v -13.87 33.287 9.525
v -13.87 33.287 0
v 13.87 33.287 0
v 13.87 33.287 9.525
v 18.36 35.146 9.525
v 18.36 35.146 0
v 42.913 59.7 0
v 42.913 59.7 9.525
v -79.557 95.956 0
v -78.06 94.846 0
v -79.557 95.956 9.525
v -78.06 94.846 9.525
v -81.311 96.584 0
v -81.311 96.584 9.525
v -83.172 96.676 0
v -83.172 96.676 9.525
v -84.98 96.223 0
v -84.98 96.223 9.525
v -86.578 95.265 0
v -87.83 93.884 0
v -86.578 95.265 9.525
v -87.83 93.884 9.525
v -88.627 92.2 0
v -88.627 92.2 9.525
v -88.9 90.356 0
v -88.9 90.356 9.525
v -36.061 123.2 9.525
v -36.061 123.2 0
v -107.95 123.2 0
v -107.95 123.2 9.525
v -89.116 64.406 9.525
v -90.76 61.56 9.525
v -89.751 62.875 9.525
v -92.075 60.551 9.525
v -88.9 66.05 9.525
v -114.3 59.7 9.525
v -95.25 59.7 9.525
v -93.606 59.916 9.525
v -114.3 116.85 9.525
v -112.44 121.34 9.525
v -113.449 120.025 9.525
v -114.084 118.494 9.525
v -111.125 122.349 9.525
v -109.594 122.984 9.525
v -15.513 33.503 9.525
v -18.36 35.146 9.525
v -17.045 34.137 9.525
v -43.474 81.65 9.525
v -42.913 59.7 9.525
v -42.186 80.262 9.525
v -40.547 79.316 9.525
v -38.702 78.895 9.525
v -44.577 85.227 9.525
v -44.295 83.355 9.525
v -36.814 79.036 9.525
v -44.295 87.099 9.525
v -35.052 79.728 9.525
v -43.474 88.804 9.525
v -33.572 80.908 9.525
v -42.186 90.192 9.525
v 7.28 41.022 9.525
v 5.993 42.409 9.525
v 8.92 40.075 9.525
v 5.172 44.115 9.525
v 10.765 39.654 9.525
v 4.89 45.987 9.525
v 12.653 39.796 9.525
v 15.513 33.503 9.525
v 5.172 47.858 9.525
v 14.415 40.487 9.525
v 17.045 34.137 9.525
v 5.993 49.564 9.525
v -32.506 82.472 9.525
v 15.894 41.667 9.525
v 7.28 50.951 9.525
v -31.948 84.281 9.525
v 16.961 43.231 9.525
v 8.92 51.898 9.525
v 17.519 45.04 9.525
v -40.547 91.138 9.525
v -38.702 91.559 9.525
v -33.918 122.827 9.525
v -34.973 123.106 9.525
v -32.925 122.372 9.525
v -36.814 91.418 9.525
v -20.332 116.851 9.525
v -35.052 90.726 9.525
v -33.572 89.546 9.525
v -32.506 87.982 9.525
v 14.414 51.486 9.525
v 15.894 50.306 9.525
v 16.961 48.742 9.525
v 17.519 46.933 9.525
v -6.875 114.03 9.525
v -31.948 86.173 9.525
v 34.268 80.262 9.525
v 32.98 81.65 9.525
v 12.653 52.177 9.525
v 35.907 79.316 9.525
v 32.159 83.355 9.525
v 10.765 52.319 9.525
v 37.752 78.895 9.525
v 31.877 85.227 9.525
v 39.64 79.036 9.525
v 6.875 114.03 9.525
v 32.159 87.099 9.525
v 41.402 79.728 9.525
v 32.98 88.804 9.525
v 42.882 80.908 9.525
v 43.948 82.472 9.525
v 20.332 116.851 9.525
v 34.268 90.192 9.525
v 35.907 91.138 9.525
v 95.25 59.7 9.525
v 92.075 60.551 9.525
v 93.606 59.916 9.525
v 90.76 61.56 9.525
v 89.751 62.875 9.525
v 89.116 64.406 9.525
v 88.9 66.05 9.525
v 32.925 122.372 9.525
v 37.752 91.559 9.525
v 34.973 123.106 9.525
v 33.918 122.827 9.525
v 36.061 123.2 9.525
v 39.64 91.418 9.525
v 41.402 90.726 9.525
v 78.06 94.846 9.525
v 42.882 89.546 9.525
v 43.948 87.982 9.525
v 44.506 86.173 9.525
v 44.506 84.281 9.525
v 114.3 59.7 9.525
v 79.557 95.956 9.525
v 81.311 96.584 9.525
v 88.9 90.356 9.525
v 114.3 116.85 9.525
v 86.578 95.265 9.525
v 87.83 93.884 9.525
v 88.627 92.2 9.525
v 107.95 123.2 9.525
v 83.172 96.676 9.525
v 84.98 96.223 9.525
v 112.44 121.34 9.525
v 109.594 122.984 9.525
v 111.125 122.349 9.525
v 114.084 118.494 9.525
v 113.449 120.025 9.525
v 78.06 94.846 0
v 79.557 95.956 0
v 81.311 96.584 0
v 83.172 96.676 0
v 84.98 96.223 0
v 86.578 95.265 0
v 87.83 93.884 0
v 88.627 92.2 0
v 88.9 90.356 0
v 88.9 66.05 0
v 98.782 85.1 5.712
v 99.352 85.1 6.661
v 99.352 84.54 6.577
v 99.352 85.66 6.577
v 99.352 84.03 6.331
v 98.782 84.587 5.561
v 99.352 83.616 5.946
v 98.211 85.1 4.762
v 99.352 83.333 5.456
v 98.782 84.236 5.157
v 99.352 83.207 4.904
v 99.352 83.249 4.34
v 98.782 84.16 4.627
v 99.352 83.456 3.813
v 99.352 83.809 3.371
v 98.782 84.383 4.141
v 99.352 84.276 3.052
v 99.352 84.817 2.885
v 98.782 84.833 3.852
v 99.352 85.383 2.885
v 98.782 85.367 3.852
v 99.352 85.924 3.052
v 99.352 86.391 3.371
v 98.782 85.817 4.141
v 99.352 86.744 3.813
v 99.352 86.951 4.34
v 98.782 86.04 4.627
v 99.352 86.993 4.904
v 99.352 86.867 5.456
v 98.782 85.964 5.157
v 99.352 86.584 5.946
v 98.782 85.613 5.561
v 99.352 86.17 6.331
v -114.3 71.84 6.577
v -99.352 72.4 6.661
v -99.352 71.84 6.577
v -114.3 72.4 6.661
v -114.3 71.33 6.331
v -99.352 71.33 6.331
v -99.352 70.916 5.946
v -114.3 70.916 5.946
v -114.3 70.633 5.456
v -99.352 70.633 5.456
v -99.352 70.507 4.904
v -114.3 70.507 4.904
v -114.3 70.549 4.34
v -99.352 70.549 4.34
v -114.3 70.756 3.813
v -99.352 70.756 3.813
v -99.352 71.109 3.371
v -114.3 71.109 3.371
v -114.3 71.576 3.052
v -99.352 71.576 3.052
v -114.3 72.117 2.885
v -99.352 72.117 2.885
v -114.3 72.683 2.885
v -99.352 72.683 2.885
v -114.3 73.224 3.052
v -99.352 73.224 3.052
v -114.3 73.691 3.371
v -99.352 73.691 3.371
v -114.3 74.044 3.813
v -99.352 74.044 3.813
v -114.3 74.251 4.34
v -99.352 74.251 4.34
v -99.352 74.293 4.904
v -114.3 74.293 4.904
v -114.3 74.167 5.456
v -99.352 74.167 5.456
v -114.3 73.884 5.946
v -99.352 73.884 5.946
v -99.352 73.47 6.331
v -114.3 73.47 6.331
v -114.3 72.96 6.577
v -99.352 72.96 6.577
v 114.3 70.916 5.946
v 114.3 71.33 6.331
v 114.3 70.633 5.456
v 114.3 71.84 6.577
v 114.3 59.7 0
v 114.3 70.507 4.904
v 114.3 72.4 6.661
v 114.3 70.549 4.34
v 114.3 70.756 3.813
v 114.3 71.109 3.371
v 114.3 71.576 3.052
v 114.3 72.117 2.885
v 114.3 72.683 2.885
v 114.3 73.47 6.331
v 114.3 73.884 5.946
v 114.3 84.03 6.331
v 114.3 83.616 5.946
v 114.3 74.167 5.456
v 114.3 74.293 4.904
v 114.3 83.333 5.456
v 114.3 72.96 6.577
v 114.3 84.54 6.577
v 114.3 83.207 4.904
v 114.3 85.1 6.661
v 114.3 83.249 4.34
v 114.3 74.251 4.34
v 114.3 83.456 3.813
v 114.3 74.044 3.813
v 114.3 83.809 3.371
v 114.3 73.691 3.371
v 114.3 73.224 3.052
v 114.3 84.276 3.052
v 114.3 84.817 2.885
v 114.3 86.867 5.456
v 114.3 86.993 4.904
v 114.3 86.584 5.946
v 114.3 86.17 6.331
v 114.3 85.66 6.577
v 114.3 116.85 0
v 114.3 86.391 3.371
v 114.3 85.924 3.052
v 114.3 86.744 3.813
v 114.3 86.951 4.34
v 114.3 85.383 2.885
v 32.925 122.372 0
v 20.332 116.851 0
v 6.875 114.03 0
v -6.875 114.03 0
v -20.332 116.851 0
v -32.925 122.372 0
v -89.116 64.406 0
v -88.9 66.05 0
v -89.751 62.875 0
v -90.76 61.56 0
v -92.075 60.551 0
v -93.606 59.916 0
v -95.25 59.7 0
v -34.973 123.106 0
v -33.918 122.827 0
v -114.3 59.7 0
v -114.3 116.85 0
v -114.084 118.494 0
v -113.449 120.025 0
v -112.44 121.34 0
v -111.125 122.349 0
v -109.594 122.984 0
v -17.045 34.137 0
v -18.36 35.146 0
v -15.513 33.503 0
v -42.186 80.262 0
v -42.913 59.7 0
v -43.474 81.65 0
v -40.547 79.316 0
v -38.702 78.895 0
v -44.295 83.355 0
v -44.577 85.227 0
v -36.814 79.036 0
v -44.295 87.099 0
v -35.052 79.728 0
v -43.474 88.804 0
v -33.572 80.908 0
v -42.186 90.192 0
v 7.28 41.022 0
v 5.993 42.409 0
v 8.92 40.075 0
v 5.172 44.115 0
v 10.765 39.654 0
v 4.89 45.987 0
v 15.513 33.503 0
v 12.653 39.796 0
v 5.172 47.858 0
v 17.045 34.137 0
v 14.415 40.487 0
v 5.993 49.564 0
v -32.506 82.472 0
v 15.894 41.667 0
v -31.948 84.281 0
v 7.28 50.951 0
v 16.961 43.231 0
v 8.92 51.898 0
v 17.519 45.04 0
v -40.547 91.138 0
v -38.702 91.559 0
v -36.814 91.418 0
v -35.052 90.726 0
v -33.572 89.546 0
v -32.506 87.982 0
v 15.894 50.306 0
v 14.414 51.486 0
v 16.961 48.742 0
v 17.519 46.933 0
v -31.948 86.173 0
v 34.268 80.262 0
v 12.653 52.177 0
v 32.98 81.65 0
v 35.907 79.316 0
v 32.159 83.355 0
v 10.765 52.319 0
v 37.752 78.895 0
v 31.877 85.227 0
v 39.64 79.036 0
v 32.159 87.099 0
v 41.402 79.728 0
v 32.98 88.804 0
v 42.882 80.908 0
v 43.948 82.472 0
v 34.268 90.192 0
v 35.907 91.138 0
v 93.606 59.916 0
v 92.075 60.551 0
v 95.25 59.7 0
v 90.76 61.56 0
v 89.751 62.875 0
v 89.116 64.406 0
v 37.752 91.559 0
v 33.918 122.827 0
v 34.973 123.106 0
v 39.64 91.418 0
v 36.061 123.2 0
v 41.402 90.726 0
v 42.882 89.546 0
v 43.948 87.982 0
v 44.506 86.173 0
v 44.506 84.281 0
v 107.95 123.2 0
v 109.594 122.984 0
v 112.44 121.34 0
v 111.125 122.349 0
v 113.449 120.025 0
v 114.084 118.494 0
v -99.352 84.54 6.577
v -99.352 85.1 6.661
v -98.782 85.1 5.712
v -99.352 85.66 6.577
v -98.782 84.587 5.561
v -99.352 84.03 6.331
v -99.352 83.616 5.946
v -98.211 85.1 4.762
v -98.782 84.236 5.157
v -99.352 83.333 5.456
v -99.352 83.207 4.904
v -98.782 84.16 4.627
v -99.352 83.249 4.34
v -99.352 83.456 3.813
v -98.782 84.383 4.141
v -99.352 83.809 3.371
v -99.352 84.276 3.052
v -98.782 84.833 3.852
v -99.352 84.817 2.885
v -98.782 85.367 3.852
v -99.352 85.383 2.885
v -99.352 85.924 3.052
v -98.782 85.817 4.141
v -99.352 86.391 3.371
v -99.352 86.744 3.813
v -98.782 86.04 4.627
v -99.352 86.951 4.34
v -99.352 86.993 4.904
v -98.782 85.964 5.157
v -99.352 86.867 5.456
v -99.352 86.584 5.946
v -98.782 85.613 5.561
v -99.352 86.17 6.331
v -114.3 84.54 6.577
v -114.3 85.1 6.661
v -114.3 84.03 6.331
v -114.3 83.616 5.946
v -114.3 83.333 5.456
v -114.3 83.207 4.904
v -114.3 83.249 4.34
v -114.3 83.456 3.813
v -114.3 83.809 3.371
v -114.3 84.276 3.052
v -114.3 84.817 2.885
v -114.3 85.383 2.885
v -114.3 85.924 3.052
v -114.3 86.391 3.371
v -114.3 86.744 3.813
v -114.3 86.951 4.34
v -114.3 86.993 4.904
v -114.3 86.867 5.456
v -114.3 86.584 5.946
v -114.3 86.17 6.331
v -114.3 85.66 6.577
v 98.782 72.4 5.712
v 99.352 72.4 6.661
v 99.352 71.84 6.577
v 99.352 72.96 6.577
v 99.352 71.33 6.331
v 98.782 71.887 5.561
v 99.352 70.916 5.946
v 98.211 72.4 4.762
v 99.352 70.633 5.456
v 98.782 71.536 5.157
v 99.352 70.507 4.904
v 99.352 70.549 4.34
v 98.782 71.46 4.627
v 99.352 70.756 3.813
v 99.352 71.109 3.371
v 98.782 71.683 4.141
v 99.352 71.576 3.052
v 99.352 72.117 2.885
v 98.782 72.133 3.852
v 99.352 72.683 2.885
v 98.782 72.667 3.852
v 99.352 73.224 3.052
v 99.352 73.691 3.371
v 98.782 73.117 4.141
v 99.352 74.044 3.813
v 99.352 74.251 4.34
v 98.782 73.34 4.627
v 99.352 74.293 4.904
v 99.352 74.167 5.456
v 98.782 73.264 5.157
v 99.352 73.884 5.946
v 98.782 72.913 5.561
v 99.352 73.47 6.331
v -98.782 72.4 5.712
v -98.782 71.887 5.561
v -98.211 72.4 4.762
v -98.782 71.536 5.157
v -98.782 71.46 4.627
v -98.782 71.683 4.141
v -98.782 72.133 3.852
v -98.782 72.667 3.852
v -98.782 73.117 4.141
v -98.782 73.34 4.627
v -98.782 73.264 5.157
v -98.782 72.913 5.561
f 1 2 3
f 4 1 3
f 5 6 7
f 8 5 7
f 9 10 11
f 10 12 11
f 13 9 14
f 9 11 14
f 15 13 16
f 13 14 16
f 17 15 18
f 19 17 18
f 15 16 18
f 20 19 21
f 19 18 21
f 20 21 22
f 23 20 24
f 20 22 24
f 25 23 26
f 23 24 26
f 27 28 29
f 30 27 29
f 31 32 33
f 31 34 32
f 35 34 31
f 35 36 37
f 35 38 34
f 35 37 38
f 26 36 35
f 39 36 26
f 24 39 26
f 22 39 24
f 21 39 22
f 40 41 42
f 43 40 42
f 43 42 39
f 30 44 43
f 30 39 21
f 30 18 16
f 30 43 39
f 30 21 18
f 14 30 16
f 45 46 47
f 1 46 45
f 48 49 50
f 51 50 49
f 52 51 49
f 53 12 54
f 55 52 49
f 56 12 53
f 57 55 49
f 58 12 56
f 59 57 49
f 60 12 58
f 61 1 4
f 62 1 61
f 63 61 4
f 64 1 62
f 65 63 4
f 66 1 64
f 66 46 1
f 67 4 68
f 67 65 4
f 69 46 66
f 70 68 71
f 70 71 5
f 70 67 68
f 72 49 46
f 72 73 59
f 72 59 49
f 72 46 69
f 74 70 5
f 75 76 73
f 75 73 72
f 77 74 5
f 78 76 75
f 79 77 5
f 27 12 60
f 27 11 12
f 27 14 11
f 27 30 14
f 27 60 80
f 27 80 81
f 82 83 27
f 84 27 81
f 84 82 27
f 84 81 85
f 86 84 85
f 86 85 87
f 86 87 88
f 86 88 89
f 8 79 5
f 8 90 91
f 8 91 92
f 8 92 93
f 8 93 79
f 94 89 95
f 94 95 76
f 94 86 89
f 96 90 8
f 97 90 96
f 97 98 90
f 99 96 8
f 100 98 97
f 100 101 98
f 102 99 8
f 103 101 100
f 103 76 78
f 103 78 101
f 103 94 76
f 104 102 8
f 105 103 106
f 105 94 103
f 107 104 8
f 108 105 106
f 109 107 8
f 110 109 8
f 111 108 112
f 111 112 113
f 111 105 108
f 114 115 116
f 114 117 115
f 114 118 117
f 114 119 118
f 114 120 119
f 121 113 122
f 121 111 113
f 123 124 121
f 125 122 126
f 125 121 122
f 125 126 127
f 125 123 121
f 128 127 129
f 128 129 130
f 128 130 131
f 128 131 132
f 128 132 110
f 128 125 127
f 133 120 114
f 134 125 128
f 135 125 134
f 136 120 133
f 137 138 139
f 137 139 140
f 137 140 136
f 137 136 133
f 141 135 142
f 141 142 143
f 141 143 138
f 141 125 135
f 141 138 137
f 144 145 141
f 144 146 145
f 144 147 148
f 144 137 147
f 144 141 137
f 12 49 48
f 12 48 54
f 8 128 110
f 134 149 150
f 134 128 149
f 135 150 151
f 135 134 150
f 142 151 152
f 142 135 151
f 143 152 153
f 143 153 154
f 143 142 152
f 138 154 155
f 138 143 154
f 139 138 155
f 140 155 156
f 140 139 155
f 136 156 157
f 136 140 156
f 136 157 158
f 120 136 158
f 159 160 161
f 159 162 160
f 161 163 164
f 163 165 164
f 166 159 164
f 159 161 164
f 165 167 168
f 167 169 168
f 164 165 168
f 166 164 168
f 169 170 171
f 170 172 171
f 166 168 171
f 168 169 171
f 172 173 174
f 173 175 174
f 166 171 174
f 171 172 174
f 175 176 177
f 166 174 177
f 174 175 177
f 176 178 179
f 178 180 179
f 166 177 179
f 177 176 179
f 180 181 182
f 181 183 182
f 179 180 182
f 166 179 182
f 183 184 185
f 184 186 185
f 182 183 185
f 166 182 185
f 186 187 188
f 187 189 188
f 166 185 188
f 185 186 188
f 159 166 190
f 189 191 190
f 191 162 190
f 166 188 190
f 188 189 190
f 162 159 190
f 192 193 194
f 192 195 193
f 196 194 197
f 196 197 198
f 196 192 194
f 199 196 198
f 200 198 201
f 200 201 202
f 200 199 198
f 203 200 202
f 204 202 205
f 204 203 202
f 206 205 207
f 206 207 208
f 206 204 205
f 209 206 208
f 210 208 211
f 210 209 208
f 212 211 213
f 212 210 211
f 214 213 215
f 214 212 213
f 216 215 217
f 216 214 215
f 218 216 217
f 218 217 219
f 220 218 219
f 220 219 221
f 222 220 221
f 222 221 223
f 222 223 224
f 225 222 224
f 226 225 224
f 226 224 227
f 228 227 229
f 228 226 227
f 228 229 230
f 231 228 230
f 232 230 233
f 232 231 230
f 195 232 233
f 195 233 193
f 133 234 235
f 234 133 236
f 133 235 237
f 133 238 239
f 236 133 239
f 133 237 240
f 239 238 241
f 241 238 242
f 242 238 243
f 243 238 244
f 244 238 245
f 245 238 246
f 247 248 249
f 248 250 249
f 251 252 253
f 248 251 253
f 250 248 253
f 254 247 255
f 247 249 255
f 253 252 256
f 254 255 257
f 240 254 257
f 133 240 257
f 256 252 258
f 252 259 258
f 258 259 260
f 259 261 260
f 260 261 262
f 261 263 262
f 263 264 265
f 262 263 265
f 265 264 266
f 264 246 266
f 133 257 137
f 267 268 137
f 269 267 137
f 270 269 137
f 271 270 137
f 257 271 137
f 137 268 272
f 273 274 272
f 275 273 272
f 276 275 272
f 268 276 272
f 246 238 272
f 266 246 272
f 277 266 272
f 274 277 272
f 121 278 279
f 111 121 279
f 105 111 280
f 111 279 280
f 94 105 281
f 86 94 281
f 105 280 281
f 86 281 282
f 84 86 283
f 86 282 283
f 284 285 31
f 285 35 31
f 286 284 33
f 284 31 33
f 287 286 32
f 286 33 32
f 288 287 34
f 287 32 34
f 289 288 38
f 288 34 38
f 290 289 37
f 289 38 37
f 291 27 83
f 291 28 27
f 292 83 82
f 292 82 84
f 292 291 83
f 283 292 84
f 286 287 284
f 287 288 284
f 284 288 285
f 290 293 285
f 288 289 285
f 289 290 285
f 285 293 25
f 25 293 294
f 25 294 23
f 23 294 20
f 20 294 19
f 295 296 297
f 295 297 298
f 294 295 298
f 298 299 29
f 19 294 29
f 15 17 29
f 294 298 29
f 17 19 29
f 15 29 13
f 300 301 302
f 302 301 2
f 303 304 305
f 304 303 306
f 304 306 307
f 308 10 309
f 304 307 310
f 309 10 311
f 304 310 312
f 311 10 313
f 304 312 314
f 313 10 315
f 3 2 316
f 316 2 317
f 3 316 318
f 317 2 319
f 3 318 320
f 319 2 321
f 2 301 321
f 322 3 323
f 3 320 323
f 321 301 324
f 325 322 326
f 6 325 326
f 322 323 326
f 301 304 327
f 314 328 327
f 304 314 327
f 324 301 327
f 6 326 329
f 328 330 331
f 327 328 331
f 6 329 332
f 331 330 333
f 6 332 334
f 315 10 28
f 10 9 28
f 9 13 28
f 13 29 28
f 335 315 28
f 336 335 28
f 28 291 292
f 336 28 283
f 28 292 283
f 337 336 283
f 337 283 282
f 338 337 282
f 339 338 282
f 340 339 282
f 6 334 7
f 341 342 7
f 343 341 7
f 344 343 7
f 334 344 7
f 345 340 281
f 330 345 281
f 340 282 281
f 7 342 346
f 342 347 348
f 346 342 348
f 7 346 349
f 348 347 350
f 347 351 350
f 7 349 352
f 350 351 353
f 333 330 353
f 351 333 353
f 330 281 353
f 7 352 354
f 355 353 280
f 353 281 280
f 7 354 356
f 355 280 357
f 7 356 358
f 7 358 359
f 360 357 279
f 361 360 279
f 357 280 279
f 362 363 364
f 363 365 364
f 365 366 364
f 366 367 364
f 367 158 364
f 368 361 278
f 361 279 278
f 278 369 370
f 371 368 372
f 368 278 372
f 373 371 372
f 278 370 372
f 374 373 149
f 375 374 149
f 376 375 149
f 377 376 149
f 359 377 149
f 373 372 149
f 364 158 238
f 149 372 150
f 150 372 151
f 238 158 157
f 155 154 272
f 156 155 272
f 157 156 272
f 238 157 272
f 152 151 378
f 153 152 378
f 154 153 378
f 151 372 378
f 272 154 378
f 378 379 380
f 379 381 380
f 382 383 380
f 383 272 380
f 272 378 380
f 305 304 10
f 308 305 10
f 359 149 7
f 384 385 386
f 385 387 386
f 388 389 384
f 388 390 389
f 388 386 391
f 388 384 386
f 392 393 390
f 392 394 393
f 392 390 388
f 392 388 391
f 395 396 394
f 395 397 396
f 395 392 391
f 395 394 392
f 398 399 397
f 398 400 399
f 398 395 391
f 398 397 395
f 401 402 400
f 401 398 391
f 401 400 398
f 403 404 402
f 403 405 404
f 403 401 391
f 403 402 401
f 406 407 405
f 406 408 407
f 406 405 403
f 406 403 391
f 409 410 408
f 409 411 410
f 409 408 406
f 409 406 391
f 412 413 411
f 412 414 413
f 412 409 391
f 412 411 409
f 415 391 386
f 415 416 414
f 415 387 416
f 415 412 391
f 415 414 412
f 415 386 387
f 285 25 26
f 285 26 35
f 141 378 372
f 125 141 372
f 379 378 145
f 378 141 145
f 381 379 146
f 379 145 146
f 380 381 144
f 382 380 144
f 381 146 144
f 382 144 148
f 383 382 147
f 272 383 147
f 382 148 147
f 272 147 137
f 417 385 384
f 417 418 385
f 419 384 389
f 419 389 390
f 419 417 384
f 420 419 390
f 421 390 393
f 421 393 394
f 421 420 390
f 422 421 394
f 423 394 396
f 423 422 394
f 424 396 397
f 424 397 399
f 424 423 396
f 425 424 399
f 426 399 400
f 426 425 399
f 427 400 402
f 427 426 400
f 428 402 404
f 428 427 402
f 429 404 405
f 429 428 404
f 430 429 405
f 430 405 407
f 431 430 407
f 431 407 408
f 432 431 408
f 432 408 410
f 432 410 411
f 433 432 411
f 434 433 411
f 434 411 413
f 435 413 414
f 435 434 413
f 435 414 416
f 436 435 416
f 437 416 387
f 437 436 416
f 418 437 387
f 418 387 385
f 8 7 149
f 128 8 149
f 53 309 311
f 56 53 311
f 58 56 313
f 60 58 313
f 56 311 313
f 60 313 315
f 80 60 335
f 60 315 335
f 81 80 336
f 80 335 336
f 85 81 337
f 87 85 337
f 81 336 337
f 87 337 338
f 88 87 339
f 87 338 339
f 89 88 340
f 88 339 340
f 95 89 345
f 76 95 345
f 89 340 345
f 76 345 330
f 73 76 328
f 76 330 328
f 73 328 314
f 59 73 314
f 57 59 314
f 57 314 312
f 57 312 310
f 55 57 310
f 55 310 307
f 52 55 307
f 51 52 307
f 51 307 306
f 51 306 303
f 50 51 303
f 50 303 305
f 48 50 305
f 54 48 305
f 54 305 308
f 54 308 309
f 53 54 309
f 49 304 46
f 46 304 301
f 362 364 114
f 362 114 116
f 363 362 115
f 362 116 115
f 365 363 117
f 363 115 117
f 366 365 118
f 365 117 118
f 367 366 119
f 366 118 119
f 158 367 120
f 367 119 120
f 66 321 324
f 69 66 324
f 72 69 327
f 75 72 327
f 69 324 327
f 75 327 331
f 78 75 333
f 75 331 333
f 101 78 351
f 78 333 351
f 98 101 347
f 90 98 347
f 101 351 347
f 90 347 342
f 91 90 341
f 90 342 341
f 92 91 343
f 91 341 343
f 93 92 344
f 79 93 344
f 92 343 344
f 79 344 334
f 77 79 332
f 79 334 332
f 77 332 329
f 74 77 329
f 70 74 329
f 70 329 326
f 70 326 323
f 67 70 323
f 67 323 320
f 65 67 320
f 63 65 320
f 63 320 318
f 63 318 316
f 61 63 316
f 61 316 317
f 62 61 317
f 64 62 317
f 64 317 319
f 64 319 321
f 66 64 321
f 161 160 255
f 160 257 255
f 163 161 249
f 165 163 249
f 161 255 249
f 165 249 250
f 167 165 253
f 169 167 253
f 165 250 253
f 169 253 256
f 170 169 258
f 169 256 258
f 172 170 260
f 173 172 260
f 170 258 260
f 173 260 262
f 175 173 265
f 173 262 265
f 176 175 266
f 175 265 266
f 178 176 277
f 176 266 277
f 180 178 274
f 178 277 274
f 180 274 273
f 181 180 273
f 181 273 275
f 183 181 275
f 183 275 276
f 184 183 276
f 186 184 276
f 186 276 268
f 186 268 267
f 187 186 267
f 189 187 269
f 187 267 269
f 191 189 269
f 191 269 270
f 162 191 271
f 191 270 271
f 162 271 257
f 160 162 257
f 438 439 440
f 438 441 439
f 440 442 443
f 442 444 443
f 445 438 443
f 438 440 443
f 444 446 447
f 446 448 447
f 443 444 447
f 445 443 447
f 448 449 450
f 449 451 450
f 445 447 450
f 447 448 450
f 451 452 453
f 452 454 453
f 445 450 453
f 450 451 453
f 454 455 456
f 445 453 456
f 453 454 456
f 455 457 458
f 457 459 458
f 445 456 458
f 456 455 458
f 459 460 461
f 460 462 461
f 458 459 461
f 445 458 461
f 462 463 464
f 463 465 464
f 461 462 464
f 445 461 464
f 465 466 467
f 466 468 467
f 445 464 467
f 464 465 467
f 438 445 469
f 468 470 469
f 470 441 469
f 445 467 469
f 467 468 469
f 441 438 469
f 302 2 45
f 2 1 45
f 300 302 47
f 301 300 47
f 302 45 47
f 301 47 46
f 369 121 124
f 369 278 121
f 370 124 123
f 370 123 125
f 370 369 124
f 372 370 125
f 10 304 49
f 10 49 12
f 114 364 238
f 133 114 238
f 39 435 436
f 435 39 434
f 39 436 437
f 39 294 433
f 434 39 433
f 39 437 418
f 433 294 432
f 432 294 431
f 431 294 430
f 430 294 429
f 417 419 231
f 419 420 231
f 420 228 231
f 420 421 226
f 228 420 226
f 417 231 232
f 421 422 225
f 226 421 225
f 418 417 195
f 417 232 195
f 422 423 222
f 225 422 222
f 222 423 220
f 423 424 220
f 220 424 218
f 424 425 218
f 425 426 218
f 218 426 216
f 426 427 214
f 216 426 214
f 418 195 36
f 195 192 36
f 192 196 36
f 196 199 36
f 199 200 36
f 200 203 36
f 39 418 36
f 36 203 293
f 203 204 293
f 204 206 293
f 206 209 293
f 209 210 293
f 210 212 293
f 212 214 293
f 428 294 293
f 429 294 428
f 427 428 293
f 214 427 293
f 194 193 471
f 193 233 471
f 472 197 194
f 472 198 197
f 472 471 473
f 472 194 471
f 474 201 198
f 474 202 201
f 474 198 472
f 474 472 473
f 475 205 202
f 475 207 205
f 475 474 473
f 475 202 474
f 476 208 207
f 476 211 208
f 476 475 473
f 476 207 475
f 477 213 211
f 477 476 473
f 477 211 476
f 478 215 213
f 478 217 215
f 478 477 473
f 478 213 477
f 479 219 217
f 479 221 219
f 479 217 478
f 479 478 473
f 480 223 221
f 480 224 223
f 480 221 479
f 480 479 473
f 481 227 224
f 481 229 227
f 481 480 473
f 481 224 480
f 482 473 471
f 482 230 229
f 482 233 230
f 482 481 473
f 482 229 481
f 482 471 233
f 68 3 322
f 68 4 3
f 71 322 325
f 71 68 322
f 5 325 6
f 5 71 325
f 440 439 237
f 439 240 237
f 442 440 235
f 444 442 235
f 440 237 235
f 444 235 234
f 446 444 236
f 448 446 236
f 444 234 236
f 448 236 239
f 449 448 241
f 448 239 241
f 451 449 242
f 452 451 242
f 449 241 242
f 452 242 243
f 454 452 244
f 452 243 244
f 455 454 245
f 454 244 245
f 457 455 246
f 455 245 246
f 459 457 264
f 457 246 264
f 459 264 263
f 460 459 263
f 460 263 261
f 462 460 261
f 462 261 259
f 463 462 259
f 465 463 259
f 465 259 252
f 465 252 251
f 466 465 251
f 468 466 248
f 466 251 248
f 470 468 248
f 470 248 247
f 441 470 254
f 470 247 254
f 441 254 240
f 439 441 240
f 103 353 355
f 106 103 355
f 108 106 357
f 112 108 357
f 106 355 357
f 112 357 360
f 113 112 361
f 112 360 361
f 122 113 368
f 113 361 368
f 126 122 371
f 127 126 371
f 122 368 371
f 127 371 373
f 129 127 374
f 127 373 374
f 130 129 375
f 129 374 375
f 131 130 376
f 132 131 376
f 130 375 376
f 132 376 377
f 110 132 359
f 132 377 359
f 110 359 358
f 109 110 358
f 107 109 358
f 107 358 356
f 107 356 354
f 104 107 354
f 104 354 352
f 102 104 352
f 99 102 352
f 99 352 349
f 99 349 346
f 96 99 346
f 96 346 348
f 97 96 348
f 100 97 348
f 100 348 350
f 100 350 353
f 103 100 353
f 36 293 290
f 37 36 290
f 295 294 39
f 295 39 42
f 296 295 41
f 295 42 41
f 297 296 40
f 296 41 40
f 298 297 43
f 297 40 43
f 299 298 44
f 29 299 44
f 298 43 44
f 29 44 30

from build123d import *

# Parameters (mm, degrees)
BOSS_EXTRUDE1_DEPTH             = 9.525
F_1_2_0_5_DIAMETER_HOLE1_D      = 12.7
SKETCH7_R                       = 66.675
CUT_EXTRUDE1_DEPTH              = 169.325445566
CUT_EXTRUDE2_DEPTH              = 169.325445566
FILLET1_R                       = 6.35
F_10_24_TAPPED_HOLE1_AT_2_COUNT = 2
F_10_24_TAPPED_HOLE1_AT_2_PITCH = 12.7


with BuildPart() as part:
    # Sketch2 → Boss-Extrude1 (new body)
    with BuildSketch(Plane.XY):
        Polygon((-16.500012242, 33.286517476), (16.500012242, 33.286517476), (42.913494767, 59.7), (114.3, 59.7), (114.3, 123.2), (-114.3, 123.2), (-114.3, 59.7), (-42.913494767, 59.7), align=None)
    extrude(amount=BOSS_EXTRUDE1_DEPTH)

    # 1/2 (0.5) Diameter Hole1 (through all)
    with Locations(Plane.XY.offset(9.525)):
        with Locations((-38.227, 85.227), (38.227, 85.227), (11.2395, 45.986517476)):
            Hole(F_1_2_0_5_DIAMETER_HOLE1_D / 2)

    # Sketch7 → Cut-Extrude1 (cut, through all)
    with BuildSketch(Plane(origin=(0, 0, 0), x_dir=(-1, 0, 0), z_dir=(0, 0, -1))):
        with Locations((0, 180.35)):
            Circle(SKETCH7_R)
    extrude(amount=-CUT_EXTRUDE1_DEPTH, mode=Mode.SUBTRACT)

    # Sketch13 → Cut-Extrude2 (cut, through all)
    with BuildSketch(Plane(origin=(0, 0, 0), x_dir=(-1, 0, 0), z_dir=(0, 0, -1))):
        Polygon((42.913494767, 59.7), (88.9, 105.686505233), (88.9, 59.7), align=None)
        Polygon((-42.913494767, 59.7), (-88.9, 105.686505233), (-88.9, 59.7), align=None)
    extrude(amount=-CUT_EXTRUDE2_DEPTH, mode=Mode.SUBTRACT)

    # Fillet1
    fillet1_edges = [part.edges().sort_by_distance(p)[0] for p in [
        (-114.3, 123.2, 4.7625),
        (114.3, 123.2, 4.7625),
        (16.500012242, 33.286517476, 4.7625),
        (-16.500012242, 33.286517476, 4.7625),
        (-34.342875899, 123.2, 4.7625),
        (34.342875899, 123.2, 4.7625),
        (-88.9, 59.7, 4.7625),
        (-88.9, 105.686505233, 4.7625),
        (88.9, 59.7, 4.7625),
        (88.9, 105.686505233, 4.7625),
    ]]
    fillet(fillet1_edges, radius=FILLET1_R)

    # Sketch12 → #10-24 Tapped Hole1 (revolve, cut)
    with BuildSketch(Plane(origin=(-114.3, 85.1, 4.7625), x_dir=(0, 0, 1), z_dir=(0, 1, 0))):
        Polygon((0, 0), (0, 16.088724014), (1.89865, 14.9479), (1.89865, 0), align=None)
    f_10_24_tapped_hole1 = revolve(axis=Axis((-120.65, 85.1, 4.7625), (1, 0, 0)), mode=Mode.SUBTRACT)

    # #10-24 Tapped Hole1 at 2: #10-24 Tapped Hole1 ×2
    with Locations(*[(0, -i * F_10_24_TAPPED_HOLE1_AT_2_PITCH, 0) for i in range(1, F_10_24_TAPPED_HOLE1_AT_2_COUNT)]):
        add(f_10_24_tapped_hole1, mode=Mode.SUBTRACT)

    # Mirror1: #10-24 Tapped Hole1 across plane
    add(f_10_24_tapped_hole1.mirror(Plane(origin=(0, 0, 0), x_dir=(0, 0, 1), z_dir=(1, 0, 0))), mode=Mode.SUBTRACT)

    # Mirror1 copy 1 sketch → Mirror1 copy 1 (revolve, cut)
    with BuildSketch(Plane(origin=(114.3, 72.4, 4.7625), x_dir=(0, 0, 1), z_dir=(0, 1, 0))):
        Polygon((0, 0), (0, -16.088724014), (1.89865, -14.9479), (1.89865, 0), align=None)
    revolve(axis=Axis((120.65, 72.4, 4.7625), (1, 0, 0)), mode=Mode.SUBTRACT)


solid = part.part
